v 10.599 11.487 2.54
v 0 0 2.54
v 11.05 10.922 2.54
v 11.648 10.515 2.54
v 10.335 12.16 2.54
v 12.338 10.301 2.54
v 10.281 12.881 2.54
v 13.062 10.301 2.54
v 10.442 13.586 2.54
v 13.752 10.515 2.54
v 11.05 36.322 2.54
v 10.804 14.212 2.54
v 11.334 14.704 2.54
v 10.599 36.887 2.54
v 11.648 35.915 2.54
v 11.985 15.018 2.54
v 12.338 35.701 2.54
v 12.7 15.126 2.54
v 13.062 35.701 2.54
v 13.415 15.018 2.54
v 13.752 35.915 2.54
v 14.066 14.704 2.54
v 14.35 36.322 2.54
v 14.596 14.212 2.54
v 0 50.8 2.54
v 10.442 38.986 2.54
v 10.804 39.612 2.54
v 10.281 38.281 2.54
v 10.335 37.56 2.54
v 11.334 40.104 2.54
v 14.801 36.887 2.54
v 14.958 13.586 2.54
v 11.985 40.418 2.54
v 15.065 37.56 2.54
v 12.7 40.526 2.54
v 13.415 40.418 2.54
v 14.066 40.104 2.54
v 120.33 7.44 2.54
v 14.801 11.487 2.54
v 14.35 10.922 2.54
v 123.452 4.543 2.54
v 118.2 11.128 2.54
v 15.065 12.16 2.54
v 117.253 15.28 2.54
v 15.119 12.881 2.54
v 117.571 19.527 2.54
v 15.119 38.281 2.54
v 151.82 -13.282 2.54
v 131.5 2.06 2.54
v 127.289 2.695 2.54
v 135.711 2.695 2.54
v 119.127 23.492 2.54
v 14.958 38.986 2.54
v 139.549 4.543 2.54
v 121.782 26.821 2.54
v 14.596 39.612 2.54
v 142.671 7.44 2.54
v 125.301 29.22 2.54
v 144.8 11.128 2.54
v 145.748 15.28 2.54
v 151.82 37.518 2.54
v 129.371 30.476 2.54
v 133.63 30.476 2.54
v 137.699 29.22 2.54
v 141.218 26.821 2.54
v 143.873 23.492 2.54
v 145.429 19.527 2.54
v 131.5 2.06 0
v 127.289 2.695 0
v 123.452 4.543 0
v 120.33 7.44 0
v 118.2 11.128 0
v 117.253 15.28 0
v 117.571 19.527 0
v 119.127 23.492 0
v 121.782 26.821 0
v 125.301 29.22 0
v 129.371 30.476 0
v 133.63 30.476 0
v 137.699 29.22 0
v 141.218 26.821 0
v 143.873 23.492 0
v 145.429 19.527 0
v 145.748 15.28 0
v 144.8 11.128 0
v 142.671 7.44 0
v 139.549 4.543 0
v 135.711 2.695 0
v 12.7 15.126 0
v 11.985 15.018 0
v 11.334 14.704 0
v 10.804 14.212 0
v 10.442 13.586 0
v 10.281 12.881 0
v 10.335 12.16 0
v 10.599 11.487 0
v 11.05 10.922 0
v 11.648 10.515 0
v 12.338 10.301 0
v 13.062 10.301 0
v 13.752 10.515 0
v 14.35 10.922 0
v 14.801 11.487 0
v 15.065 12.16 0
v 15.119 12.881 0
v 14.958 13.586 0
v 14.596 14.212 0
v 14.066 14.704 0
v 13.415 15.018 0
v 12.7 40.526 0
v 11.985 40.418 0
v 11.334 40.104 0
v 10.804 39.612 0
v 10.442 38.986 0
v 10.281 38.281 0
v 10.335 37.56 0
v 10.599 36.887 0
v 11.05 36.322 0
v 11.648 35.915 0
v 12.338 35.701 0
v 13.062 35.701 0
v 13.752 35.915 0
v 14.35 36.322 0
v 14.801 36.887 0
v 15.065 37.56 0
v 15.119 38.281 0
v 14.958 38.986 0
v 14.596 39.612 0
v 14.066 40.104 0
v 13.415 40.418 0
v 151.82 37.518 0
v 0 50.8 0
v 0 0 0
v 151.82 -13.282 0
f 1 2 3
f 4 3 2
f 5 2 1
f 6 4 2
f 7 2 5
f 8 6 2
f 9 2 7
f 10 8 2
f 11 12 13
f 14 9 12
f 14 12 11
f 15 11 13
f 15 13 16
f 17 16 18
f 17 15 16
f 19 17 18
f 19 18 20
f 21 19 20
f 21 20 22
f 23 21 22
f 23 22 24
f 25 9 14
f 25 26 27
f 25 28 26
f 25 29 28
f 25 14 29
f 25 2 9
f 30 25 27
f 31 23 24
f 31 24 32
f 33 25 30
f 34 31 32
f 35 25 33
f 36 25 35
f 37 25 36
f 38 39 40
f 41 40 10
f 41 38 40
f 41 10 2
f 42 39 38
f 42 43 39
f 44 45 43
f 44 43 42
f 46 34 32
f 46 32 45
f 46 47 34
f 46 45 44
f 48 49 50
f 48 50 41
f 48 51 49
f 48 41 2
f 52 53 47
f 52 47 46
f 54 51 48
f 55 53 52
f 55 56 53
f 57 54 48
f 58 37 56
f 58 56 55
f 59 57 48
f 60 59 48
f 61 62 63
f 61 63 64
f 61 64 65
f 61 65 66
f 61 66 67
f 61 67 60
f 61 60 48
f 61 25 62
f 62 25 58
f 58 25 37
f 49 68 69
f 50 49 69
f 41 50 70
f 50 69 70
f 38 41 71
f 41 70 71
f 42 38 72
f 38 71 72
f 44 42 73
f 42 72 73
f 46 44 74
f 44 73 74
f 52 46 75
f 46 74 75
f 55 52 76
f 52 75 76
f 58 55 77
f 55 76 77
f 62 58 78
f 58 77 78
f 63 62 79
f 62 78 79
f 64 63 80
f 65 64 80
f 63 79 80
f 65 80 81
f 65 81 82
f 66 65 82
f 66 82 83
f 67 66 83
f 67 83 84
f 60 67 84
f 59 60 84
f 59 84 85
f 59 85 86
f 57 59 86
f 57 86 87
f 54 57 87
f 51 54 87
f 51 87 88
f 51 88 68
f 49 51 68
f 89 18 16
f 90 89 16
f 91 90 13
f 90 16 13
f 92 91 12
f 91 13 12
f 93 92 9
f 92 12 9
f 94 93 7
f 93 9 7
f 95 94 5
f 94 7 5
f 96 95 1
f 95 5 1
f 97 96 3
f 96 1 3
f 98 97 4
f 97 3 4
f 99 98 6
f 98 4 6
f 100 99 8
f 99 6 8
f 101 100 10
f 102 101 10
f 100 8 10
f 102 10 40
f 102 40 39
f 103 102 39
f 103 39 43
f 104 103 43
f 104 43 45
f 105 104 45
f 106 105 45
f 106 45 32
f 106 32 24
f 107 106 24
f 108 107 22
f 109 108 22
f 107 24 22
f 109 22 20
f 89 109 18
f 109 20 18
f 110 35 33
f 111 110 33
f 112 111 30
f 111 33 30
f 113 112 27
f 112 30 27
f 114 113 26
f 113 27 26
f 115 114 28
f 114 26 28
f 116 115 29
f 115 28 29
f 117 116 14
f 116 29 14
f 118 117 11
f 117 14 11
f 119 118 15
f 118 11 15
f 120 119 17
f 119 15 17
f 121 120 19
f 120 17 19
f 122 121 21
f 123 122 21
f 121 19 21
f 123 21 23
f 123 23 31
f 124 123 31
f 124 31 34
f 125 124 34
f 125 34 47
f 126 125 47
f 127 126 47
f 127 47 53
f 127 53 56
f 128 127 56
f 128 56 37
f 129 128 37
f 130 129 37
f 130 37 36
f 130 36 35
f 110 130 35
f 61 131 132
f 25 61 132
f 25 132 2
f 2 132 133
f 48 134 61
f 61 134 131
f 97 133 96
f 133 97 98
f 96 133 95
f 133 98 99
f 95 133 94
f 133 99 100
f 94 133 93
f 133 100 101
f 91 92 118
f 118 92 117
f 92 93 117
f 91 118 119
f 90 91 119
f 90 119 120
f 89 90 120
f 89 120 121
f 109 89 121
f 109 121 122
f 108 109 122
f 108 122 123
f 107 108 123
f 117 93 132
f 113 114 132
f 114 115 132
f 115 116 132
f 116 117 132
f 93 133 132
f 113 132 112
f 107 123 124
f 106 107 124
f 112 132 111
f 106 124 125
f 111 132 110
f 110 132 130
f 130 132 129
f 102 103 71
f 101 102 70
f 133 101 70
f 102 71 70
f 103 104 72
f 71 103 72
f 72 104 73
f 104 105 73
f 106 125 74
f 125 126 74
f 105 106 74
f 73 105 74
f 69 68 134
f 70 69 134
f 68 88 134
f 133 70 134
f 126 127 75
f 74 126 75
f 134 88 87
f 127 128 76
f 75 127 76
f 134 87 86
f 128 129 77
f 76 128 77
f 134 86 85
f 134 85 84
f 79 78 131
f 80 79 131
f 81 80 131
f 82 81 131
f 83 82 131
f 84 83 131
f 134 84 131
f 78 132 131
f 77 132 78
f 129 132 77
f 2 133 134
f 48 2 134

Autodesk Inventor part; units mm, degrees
ref_plane "YZ Plane" through (0, 0, 0) normal (1, 0, 0) x (0, 1, 0)
ref_plane "XZ Plane" through (0, 0, 0) normal (0, 1, 0) x (-1, 0, 0)
ref_plane "XY Plane" through (0, 0, 0) normal (0, 0, 1) x (1, 0, 0)
sketch "Sketch1" plane through (0, 0, 0) normal (0, 0, 1) x (1, 0, 0)
  line L0 (0, 0) -> (151.8201, -13.2825)
  line L1 (151.8201, -13.2825) -> (151.8201, 37.5175)
  line L2 (151.8201, 37.5175) -> (0, 50.8)
  line L3 (0, 50.8) -> (0, 0)
  dimension "d0" = 50.8
  dimension "d1" = 50.8
  dimension "d2" = 85
  dimension "d3" = 152.4
extrude "Extrusion1" add sketch "Sketch1" along normal blind 2.54
hole "Hole1" at (131.5001, 16.3479, 2.54) direction (0, 0, -1) diameter 28.575 end through all
sketch "Sketch2" plane through (0, 0, 0) normal (0, 0, -1) x (-1, 0, 0)
  line L0 (0, 0) -> (-151.8201, -13.2825) projected
  line L1 (0, 0) -> (-33.0355, 0)
  line L2 (0, 50.8) -> (0, 0) projected
  point P0 (-12.7, 38.1)
  point P1 (-12.7, 12.7)
  dimension "d15" = 12.7
  dimension "d16" = 38.1
  dimension "d17" = 12.7
  dimension "d18" = 12.7
hole "Hole2" at (12.7, 38.1, 0) at (12.7, 12.7, 0) direction (0, 0, 1) diameter 4.8514 end through all
properties part number "CAR_050_Sweeper Bar arms"
